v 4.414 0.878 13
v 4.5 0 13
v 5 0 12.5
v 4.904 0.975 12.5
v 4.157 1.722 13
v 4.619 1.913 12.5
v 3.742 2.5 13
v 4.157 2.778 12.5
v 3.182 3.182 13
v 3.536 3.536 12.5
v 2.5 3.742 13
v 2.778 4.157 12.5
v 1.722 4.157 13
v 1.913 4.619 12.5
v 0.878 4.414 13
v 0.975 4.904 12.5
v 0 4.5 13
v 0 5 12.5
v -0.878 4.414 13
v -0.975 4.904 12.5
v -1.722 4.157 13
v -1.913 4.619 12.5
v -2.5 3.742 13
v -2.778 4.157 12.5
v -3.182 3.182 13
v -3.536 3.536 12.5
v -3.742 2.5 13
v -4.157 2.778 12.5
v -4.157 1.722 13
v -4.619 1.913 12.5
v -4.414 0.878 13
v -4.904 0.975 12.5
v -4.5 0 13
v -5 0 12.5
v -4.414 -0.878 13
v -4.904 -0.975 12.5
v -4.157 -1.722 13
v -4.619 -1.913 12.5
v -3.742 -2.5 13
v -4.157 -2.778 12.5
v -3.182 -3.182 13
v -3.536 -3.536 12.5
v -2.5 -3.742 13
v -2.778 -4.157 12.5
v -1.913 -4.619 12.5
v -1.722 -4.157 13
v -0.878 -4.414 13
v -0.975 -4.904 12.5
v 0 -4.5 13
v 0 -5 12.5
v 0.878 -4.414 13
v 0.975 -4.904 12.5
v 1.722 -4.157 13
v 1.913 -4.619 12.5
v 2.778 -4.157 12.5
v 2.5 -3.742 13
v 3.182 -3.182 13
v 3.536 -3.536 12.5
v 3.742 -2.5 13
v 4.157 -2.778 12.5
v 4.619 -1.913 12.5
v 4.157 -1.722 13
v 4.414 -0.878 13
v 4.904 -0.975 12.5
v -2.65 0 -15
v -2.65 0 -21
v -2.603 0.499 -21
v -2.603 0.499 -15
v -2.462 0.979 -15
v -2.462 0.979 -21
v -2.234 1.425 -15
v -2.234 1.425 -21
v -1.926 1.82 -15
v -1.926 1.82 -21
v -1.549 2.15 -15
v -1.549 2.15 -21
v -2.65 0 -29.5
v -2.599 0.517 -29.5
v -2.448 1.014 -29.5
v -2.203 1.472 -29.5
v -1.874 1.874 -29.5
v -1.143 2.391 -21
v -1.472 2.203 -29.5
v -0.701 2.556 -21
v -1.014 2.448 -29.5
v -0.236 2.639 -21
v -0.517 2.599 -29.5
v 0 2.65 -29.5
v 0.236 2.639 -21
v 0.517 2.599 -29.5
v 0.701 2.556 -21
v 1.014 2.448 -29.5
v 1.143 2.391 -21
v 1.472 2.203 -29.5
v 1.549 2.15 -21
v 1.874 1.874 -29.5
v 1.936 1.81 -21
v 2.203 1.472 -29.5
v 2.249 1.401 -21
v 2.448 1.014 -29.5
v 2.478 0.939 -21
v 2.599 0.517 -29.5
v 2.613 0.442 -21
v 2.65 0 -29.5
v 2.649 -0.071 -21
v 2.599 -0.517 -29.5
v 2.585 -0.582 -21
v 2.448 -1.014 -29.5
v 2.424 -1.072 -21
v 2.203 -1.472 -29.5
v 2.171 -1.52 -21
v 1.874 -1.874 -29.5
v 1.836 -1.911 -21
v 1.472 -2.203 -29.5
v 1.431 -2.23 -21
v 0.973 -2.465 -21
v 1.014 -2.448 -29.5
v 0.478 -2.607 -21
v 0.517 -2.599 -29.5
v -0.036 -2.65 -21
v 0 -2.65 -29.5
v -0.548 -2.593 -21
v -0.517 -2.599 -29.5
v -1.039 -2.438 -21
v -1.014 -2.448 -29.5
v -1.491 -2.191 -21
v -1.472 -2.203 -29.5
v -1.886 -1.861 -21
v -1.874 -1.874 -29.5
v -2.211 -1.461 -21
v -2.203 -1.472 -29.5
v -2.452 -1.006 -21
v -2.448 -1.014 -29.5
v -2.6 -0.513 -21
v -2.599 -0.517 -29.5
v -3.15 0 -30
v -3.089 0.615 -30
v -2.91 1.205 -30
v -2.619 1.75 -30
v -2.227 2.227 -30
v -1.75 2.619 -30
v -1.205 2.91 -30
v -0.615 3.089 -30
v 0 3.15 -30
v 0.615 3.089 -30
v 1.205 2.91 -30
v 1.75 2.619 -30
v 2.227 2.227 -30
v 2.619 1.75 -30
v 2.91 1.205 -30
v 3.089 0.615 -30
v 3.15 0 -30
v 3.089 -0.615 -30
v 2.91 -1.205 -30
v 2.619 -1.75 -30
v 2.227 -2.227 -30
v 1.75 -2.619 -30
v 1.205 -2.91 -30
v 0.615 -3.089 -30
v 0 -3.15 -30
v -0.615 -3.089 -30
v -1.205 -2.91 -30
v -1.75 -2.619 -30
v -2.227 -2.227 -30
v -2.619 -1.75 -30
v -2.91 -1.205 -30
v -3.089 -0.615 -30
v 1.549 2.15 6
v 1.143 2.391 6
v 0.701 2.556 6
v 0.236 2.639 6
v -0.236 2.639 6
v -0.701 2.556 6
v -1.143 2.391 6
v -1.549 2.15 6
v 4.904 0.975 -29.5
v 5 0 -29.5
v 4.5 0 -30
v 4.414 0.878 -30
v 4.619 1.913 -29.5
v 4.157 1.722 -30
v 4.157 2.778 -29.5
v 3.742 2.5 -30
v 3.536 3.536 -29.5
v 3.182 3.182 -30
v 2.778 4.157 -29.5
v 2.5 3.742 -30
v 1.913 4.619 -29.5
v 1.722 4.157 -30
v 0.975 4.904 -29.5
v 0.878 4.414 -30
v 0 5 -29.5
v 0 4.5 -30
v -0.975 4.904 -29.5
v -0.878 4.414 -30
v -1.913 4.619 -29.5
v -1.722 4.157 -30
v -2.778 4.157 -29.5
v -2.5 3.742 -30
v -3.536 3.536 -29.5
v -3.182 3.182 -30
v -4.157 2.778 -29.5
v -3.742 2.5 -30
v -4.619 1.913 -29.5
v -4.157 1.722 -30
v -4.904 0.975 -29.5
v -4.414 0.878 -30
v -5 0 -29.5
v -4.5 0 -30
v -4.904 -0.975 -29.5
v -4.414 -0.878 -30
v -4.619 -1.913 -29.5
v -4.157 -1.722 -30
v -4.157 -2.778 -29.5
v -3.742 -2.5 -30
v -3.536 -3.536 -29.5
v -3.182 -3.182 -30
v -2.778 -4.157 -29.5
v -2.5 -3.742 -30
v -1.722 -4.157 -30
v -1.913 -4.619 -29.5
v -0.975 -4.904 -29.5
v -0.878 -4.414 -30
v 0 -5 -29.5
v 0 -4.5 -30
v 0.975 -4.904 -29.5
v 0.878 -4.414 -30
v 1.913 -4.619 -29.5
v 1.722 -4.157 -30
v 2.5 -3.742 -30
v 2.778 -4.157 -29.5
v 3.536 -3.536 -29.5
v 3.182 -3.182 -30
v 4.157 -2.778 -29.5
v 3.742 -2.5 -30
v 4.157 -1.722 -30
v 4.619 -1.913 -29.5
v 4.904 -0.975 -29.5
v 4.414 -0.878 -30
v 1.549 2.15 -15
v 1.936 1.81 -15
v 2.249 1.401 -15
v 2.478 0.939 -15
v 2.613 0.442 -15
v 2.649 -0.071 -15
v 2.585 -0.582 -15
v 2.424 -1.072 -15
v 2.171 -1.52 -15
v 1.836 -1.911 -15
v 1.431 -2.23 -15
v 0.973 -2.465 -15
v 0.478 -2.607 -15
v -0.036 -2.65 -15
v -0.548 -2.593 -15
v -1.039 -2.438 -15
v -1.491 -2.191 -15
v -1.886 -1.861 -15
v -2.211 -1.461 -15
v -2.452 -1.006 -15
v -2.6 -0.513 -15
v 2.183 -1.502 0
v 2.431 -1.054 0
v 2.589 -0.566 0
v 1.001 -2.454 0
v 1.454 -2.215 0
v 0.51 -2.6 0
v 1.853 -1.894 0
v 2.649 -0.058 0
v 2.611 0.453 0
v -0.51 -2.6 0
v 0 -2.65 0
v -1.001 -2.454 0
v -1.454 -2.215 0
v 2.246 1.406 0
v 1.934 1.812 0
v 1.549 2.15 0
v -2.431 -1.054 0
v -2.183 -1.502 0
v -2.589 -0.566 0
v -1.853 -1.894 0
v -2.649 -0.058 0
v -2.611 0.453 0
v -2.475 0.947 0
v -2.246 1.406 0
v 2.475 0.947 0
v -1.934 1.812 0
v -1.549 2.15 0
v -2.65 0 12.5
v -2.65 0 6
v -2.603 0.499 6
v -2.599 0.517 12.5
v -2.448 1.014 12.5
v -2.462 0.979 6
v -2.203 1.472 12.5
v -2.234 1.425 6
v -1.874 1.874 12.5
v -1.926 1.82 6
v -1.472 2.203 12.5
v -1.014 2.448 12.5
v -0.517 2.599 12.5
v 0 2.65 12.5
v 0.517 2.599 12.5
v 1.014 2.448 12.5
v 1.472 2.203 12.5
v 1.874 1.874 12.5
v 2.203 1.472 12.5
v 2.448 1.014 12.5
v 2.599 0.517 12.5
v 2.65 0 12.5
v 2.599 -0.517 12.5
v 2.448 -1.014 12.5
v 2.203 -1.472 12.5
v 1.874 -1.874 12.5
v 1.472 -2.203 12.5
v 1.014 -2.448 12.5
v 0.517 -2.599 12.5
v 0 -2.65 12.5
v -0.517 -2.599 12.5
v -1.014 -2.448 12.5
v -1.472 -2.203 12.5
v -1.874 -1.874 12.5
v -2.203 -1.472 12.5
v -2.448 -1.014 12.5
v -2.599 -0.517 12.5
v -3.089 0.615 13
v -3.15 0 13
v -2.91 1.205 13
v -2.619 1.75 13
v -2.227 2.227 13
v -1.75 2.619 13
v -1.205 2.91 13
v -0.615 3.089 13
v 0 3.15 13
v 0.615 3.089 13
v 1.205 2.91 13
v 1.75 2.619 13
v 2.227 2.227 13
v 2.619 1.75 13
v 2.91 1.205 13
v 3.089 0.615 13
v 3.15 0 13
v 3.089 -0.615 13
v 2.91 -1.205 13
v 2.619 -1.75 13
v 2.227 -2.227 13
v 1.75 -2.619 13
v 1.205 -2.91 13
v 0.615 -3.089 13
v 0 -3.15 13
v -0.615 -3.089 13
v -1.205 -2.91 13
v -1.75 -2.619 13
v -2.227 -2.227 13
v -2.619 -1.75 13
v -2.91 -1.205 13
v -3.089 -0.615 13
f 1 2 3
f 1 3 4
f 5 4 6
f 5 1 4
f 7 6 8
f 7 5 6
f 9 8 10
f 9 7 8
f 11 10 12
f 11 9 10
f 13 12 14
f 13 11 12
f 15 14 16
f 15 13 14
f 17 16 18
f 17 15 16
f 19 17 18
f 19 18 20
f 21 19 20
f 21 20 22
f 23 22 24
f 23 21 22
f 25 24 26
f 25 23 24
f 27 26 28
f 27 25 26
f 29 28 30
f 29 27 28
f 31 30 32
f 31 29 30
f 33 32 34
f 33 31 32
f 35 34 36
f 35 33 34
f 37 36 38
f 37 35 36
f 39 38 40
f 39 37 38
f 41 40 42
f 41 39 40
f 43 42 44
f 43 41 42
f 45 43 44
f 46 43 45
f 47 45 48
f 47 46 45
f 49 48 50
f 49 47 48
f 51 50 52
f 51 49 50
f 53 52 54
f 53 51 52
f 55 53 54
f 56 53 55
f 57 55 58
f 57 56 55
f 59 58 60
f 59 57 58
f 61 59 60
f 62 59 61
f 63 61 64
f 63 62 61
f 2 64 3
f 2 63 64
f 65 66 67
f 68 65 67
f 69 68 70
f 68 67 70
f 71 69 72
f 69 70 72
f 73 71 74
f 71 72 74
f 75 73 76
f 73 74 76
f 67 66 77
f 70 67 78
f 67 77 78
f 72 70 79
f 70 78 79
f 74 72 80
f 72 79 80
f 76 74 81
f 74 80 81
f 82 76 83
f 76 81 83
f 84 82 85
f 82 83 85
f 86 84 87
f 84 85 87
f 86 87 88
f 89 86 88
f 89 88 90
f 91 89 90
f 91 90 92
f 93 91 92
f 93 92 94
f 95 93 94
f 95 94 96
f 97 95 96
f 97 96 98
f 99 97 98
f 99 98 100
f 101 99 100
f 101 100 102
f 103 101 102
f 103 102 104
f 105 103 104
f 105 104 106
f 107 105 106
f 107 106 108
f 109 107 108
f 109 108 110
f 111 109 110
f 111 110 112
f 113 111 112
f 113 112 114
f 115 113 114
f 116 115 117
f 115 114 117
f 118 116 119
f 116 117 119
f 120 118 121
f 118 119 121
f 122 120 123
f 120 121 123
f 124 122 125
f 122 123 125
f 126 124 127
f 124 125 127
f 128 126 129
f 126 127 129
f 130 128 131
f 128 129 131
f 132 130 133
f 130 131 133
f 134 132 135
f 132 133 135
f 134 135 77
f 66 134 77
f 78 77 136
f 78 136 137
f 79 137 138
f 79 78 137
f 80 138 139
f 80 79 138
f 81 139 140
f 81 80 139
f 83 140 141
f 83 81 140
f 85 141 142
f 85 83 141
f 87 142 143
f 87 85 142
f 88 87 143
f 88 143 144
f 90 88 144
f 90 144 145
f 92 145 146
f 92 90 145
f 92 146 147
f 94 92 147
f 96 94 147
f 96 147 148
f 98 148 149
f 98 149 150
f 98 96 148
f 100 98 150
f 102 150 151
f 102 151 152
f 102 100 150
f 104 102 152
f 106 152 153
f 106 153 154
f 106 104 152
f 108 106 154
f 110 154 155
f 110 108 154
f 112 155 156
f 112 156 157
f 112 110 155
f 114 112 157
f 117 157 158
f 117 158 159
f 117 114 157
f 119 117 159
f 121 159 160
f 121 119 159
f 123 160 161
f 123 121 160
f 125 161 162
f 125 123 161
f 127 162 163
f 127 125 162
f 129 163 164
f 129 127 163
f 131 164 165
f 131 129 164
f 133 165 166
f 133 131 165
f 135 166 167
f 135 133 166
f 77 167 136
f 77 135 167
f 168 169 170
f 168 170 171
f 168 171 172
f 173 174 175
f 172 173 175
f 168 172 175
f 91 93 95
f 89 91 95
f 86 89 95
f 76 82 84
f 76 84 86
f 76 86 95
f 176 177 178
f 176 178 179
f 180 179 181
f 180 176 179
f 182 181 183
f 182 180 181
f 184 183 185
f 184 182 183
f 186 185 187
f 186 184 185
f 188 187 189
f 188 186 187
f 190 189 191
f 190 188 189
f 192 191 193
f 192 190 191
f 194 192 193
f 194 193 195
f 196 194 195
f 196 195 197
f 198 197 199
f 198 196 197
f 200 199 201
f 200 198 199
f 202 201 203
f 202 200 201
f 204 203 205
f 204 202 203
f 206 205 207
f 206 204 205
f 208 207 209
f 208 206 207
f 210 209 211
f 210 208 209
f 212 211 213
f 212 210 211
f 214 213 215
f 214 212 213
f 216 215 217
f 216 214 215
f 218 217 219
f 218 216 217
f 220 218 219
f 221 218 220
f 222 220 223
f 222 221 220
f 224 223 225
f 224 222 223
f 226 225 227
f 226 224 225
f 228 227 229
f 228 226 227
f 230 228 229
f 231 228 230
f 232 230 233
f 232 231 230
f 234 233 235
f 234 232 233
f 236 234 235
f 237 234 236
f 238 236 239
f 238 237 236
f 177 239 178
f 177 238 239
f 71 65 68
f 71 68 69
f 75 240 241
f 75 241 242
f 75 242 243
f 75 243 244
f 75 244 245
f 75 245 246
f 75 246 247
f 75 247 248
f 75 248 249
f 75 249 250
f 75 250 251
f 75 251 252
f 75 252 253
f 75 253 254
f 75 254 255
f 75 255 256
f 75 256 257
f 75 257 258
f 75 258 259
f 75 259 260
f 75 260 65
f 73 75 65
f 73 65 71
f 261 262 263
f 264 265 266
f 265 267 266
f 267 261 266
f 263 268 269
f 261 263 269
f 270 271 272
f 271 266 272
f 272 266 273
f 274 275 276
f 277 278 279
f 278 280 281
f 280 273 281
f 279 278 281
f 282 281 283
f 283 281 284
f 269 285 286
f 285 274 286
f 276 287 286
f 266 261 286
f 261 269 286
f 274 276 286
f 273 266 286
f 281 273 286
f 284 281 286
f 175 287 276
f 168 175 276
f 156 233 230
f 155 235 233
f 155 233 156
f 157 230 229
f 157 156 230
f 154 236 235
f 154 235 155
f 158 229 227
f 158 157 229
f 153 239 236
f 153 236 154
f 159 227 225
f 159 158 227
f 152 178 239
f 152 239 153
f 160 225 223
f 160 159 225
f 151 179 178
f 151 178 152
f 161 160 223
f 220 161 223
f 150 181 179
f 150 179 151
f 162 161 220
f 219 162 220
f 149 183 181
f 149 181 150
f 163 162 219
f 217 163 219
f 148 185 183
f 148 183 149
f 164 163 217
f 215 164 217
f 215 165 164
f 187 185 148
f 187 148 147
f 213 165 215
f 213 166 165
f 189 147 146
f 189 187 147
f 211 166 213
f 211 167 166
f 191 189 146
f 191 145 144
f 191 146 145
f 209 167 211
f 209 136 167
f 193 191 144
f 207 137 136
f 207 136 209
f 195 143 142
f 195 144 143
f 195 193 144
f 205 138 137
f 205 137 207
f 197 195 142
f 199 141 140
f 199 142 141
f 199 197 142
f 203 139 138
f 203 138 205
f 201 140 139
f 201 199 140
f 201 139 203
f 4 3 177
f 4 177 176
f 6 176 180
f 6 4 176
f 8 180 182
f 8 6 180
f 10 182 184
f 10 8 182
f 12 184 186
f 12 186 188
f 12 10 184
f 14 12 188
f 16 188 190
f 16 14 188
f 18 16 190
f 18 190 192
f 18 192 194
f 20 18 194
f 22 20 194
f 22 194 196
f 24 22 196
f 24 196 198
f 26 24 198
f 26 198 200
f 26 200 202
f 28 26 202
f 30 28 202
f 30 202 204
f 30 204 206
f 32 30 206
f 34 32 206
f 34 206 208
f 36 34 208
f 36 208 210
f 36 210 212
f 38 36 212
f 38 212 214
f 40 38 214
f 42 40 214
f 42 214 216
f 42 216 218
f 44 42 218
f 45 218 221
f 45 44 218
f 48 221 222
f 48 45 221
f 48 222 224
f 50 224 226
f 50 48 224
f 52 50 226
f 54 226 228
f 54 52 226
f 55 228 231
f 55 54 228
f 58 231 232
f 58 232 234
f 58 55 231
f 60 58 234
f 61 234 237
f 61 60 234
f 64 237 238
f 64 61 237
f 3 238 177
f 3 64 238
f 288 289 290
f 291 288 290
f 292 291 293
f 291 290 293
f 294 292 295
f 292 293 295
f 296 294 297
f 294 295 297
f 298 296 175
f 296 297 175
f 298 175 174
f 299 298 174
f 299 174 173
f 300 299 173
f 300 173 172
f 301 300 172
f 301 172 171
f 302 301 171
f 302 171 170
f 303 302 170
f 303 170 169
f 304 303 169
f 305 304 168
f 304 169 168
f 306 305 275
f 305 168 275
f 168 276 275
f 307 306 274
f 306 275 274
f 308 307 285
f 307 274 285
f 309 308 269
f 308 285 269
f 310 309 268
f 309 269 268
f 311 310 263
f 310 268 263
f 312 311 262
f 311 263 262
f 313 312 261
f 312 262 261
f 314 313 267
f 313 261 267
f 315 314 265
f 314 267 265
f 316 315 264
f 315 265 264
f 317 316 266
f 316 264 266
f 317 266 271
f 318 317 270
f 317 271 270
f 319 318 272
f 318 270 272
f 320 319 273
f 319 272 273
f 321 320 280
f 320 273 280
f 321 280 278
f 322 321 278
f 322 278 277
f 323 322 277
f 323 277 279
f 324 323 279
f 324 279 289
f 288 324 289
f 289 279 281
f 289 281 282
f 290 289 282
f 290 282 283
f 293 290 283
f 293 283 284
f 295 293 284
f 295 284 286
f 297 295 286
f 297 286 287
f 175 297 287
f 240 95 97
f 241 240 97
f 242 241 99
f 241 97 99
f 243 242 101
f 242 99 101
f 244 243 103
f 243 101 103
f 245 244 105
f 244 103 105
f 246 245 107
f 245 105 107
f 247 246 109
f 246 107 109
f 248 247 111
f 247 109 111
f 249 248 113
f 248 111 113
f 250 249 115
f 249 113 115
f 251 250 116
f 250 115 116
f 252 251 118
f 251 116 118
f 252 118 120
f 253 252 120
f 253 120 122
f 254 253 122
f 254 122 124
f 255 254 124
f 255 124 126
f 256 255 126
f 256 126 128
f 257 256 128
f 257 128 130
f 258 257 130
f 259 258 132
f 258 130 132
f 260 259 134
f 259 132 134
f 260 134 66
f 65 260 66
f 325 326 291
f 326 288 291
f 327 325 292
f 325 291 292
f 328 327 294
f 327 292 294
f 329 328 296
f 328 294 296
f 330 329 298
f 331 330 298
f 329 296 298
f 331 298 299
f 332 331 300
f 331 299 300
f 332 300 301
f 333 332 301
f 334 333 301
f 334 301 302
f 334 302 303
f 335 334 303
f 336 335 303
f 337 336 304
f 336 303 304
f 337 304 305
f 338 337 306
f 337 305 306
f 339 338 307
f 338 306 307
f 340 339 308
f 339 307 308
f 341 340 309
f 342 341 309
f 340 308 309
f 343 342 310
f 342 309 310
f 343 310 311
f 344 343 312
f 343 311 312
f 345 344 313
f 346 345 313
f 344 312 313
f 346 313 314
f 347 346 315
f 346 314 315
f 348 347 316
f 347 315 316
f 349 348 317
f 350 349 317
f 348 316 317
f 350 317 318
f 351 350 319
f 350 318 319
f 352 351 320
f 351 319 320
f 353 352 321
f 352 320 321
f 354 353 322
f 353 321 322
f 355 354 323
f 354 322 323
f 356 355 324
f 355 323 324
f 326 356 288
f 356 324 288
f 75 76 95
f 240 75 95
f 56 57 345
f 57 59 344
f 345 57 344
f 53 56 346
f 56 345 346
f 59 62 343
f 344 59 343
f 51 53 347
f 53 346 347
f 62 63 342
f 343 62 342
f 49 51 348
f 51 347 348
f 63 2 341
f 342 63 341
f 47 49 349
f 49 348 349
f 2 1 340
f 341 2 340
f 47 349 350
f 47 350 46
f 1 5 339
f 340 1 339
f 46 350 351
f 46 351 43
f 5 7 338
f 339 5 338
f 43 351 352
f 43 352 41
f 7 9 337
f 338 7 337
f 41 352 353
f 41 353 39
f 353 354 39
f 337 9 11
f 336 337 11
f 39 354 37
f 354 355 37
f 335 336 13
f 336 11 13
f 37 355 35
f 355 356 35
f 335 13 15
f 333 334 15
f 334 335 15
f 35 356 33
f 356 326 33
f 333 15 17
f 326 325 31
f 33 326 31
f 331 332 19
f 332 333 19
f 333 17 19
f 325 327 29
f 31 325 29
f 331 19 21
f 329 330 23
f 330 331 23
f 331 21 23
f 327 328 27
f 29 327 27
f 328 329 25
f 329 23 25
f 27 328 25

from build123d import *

# Parameters (mm, degrees)
EXTRUDE_THIN1_DEPTH = 6
SKETCH2_R           = 5.65
SKETCH2_R_2         = 2.65
BOSS_EXTRUDE1_DEPTH = 13
BOSS_EXTRUDE2_START = 30
SKETCH3_R           = 5.65
BOSS_EXTRUDE2_DEPTH = 30
CHAMFER1_SIZE       = 0.5
CHAMFER2_SIZE       = 0.5
SKETCH4_R           = 2.65
CUT_EXTRUDE1_DEPTH  = 9
CUT_EXTRUDE2_DEPTH  = 6
CHAMFER3_SIZE       = 0.5
SKETCH8_OUTSIDE_W   = 22.474
SKETCH8_OUTSIDE_H   = 22.474
SKETCH8_OUTSIDE_R   = 5
CUT_EXTRUDE5_DEPTH  = 44.736083501
CHAMFER4_SIZE       = 0.5


with BuildPart() as part:
    # Sketch1 → Extrude-Thin1 (new body)
    with BuildSketch(Plane.XY):
        with BuildLine():
            Line((-1.843908891, 3.15), (1.843908891, 3.15))
            ThreePointArc((1.843908891, 3.15), (0, -3.65), (-1.843908891, 3.15))
        make_face()
        with BuildLine():
            Line((-1.549193338, 2.15), (1.549193338, 2.15))
            ThreePointArc((1.549193338, 2.15), (0, -2.65), (-1.549193338, 2.15))
        make_face(mode=Mode.SUBTRACT)
    extrude(amount=EXTRUDE_THIN1_DEPTH)

    # Sketch2 → Boss-Extrude1 (add)
    with BuildSketch(Plane(origin=(0, 0, 0), x_dir=(-1, 0, 0), z_dir=(0, 0, -1))):
        Circle(SKETCH2_R)
        Circle(SKETCH2_R_2, mode=Mode.SUBTRACT)
    extrude(amount=-BOSS_EXTRUDE1_DEPTH)

    # Sketch3 → Boss-Extrude2 (add)
    with BuildSketch(Plane(origin=(0, 0, 0), x_dir=(-1, 0, 0), z_dir=(0, 0, -1)).offset(BOSS_EXTRUDE2_START)):
        Circle(SKETCH3_R)
    extrude(amount=-BOSS_EXTRUDE2_DEPTH)

    # Chamfer1
    # the kernel refuses this chamfer: 0.5 mm, written as the material it takes off along each edge
    with BuildSketch(Plane(origin=(0, 0, 13), x_dir=(-1, 0, 0), z_dir=(0, -1, 0))) as chamfer1_piece_1:
        Polygon((2.65 + CHAMFER1_SIZE, 0), (2.65, CHAMFER1_SIZE), (2.65, 0), align=None)
    revolve(axis=Axis((0, 0, 13), (0, 0, -1)), mode=Mode.SUBTRACT)

    # Chamfer2
    chamfer2_edges = [part.edges().sort_by_distance(p)[0] for p in [
        (5.65, 0, 13),
    ]]
    chamfer(chamfer2_edges, length=CHAMFER2_SIZE)

    # Sketch4 → Cut-Extrude1 (cut)
    with BuildSketch(Plane(origin=(0, 0, -30), x_dir=(-1, 0, 0), z_dir=(0, 0, -1))):
        Circle(SKETCH4_R)
    extrude(amount=-CUT_EXTRUDE1_DEPTH, mode=Mode.SUBTRACT)

    # Sketch5 → Cut-Extrude2 (cut)
    with BuildSketch(Plane(origin=(0, 0, -21), x_dir=(-1, 0, 0), z_dir=(0, 0, -1))):
        with BuildLine():
            Line((1.549193338, 2.15), (-1.549193338, 2.15))
            ThreePointArc((-1.549193338, 2.15), (-1.207712228, -2.358798672), (2.65, 0))
            ThreePointArc((2.65, 0), (2.358798672, 1.207712228), (1.549193338, 2.15))
        make_face()
    extrude(amount=-CUT_EXTRUDE2_DEPTH, mode=Mode.SUBTRACT)

    # Chamfer3
    chamfer3_edges = [part.edges().sort_by_distance(p)[0] for p in [
        (5.65, 0, -30),
        (2.65, 0, -30),
    ]]
    chamfer(chamfer3_edges, length=CHAMFER3_SIZE)

    # Sketch8 outside → Cut-Extrude5 (cut, through all)
    with BuildSketch(Plane.XY.offset(13)):
        Rectangle(SKETCH8_OUTSIDE_W, SKETCH8_OUTSIDE_H)
        Circle(SKETCH8_OUTSIDE_R, mode=Mode.SUBTRACT)
    extrude(amount=-CUT_EXTRUDE5_DEPTH, mode=Mode.SUBTRACT)

    # Chamfer4
    chamfer4_edges = [part.edges().sort_by_distance(p)[0] for p in [
        (-5, 0, -30),
        (-5, 0, 13),
    ]]
    chamfer(chamfer4_edges, length=CHAMFER4_SIZE)


solid = part.part
